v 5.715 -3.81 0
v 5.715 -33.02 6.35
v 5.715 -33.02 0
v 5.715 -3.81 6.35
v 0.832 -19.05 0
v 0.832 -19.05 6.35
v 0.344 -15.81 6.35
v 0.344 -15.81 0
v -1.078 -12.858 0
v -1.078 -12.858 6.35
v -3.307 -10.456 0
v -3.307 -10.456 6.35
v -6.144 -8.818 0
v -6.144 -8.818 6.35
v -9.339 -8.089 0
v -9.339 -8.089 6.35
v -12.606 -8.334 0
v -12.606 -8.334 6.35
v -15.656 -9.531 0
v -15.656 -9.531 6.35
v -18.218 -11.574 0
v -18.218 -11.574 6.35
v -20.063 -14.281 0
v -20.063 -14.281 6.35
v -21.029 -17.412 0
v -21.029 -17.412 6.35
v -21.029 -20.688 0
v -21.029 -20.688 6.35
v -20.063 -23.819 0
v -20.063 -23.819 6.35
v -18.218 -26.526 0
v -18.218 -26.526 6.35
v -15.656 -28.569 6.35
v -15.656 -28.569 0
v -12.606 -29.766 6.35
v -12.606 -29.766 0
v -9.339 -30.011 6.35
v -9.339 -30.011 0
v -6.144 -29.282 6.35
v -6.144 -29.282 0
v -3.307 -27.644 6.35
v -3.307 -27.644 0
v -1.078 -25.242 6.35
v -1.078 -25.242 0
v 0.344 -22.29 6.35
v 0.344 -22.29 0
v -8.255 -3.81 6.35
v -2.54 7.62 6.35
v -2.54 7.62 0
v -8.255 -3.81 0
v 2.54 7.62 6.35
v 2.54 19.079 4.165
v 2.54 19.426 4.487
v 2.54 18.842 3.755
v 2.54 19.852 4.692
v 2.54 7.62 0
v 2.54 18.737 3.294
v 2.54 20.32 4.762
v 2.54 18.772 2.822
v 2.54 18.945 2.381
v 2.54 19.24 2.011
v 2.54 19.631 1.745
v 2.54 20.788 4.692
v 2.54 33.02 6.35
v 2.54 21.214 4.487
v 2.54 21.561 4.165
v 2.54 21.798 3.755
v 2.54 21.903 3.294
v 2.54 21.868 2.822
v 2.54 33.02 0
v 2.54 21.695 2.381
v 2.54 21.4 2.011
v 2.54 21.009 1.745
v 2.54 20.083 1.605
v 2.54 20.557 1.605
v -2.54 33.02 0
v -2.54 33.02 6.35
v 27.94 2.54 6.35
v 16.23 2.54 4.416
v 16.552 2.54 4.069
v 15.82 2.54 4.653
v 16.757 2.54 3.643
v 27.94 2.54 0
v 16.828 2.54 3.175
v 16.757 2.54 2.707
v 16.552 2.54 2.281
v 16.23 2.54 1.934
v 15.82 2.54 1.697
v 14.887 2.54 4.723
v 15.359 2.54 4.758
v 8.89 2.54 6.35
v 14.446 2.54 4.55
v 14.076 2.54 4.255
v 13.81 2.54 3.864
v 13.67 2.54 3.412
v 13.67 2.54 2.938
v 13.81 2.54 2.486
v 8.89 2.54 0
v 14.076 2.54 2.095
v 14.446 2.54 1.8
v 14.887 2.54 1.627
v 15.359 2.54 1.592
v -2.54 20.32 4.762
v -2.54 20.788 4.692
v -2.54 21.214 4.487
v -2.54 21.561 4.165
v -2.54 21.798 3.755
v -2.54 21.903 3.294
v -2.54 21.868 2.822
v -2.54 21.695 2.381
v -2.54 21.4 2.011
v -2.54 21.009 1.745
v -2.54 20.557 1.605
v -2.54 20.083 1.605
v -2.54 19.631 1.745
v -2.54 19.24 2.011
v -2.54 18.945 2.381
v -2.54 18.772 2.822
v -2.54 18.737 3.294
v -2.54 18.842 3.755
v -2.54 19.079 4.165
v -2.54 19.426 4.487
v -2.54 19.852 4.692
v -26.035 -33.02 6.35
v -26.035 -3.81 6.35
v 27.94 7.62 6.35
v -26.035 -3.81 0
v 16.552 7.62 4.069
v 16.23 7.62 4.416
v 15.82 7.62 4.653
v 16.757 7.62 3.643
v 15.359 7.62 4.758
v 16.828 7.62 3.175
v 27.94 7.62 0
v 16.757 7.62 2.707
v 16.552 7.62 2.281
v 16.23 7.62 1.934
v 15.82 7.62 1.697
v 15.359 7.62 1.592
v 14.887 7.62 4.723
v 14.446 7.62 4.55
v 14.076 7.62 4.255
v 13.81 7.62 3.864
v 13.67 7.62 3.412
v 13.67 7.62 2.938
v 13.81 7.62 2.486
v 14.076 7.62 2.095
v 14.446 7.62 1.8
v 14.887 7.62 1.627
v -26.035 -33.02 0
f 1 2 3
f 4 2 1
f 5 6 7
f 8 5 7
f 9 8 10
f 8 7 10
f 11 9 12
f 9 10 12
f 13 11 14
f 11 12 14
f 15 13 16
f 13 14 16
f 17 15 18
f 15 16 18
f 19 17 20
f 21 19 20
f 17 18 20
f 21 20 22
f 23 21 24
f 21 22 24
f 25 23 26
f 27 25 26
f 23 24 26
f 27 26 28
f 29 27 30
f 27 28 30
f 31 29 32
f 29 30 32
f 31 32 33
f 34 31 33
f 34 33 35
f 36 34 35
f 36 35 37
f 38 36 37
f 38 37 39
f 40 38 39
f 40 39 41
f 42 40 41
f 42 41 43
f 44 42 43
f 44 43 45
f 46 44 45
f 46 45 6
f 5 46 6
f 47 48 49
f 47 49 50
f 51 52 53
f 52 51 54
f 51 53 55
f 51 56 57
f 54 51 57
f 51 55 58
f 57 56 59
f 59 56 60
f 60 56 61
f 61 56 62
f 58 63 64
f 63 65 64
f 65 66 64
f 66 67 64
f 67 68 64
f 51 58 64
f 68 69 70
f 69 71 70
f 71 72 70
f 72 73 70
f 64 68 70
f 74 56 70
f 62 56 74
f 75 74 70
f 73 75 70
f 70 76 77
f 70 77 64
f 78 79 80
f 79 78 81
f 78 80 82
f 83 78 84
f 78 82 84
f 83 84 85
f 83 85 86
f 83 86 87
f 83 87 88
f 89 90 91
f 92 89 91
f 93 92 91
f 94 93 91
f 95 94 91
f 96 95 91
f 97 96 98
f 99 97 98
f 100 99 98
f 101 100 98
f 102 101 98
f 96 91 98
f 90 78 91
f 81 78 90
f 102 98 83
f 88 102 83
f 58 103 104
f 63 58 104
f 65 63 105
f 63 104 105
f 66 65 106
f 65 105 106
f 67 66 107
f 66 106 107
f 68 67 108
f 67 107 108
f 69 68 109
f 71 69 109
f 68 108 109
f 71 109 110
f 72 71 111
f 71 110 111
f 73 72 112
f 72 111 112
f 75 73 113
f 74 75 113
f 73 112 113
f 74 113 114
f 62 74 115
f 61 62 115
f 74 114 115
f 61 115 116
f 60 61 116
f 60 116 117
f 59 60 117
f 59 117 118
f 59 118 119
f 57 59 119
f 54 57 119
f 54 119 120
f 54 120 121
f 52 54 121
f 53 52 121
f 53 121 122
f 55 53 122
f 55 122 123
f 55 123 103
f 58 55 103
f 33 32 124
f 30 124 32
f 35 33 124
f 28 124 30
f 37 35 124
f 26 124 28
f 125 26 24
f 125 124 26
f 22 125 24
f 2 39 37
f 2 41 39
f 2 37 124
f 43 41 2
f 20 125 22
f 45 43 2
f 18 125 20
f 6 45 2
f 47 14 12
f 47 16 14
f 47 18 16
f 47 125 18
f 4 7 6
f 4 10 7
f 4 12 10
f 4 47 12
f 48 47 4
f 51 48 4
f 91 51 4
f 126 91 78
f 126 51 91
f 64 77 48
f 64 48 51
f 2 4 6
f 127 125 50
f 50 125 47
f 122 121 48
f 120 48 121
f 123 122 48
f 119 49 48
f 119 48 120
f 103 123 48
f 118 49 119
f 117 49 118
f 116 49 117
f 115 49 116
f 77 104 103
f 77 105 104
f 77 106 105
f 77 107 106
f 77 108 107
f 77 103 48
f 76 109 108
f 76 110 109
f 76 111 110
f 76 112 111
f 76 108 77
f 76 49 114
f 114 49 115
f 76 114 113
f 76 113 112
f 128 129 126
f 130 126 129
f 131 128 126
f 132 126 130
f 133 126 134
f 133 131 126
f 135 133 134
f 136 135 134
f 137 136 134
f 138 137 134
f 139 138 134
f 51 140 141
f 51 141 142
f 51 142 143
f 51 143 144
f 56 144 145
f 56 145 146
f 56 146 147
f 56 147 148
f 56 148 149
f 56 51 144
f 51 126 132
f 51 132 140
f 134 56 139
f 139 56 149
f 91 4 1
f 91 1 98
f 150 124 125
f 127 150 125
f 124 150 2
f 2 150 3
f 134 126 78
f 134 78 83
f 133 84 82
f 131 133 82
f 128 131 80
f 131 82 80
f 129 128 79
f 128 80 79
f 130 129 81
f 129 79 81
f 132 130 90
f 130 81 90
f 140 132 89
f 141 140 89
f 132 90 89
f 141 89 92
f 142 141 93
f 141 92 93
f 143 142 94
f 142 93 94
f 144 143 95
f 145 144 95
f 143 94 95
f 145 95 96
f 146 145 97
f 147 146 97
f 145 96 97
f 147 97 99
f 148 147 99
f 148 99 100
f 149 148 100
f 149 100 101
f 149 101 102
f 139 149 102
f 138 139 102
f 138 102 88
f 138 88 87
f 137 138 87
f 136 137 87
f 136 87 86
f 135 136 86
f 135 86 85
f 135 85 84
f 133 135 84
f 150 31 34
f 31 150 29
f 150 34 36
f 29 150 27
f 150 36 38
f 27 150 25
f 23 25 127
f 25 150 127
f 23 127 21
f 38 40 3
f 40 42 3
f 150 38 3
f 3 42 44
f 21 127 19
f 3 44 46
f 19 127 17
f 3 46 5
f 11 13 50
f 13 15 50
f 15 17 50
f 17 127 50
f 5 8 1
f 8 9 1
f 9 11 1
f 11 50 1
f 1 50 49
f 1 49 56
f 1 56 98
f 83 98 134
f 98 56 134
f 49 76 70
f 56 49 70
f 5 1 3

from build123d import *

# Parameters (mm, degrees)
SKETCH1_W           = 27.94
SKETCH1_H           = 27.94
SKETCH1_W_2         = 5.08
SKETCH1_H_2         = 66.04
BOSS_EXTRUDE1_DEPTH = 6.35
SKETCH2_R           = 1.5875
CUT_EXTRUDE1_DEPTH  = 12.7
SKETCH3_W           = 6.35
SKETCH3_H           = 5.08
BOSS_EXTRUDE2_DEPTH = 25.4
SKETCH4_R           = 1.5875
CUT_EXTRUDE2_DEPTH  = 25.4
SKETCH5_R           = 10.99185
CUT_EXTRUDE3_DEPTH  = 25.4
BOSS_EXTRUDE3_DEPTH = 6.35
SKETCH8_W           = 31.75
SKETCH8_H           = 29.21
SKETCH8_R           = 10.99185
BOSS_EXTRUDE4_DEPTH = 6.35
SKETCH9_W           = 4.445
SKETCH9_H           = 27.94
CUT_EXTRUDE4_DEPTH  = 6.35


with BuildPart() as part:
    # Sketch1 → Boss-Extrude1 (new body)
    with BuildSketch(Plane.XY):
        with Locations((-16.51, -19.05)):
            Rectangle(SKETCH1_W, SKETCH1_H)
        Rectangle(SKETCH1_W_2, SKETCH1_H_2)
    extrude(amount=BOSS_EXTRUDE1_DEPTH)

    # Sketch2 → Cut-Extrude1 (cut)
    with BuildSketch(Plane.ZY.offset(2.54)):
        with Locations((3.175, 20.32)):
            Circle(SKETCH2_R)
    extrude(amount=-CUT_EXTRUDE1_DEPTH, mode=Mode.SUBTRACT)

    # Sketch3 → Boss-Extrude2 (add)
    with BuildSketch(Plane(origin=(2.54, 0, 0), x_dir=(0, 0, -1), z_dir=(1, 0, 0))):
        with Locations((-3.175, 5.08)):
            Rectangle(SKETCH3_W, SKETCH3_H)
    extrude(amount=BOSS_EXTRUDE2_DEPTH)

    # Sketch4 → Cut-Extrude2 (cut)
    with BuildSketch(Plane.XZ.offset(-2.54)):
        with Locations((15.24, 3.175)):
            Circle(SKETCH4_R)
    extrude(amount=-CUT_EXTRUDE2_DEPTH, mode=Mode.SUBTRACT)

    # Sketch5 → Cut-Extrude3 (cut)
    with BuildSketch(Plane.XY.offset(6.35)):
        with Locations((-10.16, -19.05)):
            Circle(SKETCH5_R)
    extrude(amount=-CUT_EXTRUDE3_DEPTH, mode=Mode.SUBTRACT)

    # Sketch6 → Boss-Extrude3 (add)
    with BuildSketch(Plane.XY.offset(6.35)):
        Polygon((-2.54, 7.62), (-8.89, -5.08), (-2.54, -5.08), align=None)
        Polygon((2.54, 2.54), (2.54, -10.16), (8.89, 2.54), align=None)
    extrude(amount=-BOSS_EXTRUDE3_DEPTH)

    # Sketch8 → Boss-Extrude4 (add)
    with BuildSketch(Plane.XY.offset(6.35)):
        with Locations((-10.16, -18.415)):
            Rectangle(SKETCH8_W, SKETCH8_H)
        with Locations((-10.16, -19.05)):
            Circle(SKETCH8_R, mode=Mode.SUBTRACT)
    extrude(amount=-BOSS_EXTRUDE4_DEPTH)

    # Sketch9 → Cut-Extrude4 (cut)
    with BuildSketch(Plane.XY.offset(6.35)):
        with Locations((-28.2575, -19.05)):
            Rectangle(SKETCH9_W, SKETCH9_H)
    extrude(amount=-CUT_EXTRUDE4_DEPTH, mode=Mode.SUBTRACT)


solid = part.part
